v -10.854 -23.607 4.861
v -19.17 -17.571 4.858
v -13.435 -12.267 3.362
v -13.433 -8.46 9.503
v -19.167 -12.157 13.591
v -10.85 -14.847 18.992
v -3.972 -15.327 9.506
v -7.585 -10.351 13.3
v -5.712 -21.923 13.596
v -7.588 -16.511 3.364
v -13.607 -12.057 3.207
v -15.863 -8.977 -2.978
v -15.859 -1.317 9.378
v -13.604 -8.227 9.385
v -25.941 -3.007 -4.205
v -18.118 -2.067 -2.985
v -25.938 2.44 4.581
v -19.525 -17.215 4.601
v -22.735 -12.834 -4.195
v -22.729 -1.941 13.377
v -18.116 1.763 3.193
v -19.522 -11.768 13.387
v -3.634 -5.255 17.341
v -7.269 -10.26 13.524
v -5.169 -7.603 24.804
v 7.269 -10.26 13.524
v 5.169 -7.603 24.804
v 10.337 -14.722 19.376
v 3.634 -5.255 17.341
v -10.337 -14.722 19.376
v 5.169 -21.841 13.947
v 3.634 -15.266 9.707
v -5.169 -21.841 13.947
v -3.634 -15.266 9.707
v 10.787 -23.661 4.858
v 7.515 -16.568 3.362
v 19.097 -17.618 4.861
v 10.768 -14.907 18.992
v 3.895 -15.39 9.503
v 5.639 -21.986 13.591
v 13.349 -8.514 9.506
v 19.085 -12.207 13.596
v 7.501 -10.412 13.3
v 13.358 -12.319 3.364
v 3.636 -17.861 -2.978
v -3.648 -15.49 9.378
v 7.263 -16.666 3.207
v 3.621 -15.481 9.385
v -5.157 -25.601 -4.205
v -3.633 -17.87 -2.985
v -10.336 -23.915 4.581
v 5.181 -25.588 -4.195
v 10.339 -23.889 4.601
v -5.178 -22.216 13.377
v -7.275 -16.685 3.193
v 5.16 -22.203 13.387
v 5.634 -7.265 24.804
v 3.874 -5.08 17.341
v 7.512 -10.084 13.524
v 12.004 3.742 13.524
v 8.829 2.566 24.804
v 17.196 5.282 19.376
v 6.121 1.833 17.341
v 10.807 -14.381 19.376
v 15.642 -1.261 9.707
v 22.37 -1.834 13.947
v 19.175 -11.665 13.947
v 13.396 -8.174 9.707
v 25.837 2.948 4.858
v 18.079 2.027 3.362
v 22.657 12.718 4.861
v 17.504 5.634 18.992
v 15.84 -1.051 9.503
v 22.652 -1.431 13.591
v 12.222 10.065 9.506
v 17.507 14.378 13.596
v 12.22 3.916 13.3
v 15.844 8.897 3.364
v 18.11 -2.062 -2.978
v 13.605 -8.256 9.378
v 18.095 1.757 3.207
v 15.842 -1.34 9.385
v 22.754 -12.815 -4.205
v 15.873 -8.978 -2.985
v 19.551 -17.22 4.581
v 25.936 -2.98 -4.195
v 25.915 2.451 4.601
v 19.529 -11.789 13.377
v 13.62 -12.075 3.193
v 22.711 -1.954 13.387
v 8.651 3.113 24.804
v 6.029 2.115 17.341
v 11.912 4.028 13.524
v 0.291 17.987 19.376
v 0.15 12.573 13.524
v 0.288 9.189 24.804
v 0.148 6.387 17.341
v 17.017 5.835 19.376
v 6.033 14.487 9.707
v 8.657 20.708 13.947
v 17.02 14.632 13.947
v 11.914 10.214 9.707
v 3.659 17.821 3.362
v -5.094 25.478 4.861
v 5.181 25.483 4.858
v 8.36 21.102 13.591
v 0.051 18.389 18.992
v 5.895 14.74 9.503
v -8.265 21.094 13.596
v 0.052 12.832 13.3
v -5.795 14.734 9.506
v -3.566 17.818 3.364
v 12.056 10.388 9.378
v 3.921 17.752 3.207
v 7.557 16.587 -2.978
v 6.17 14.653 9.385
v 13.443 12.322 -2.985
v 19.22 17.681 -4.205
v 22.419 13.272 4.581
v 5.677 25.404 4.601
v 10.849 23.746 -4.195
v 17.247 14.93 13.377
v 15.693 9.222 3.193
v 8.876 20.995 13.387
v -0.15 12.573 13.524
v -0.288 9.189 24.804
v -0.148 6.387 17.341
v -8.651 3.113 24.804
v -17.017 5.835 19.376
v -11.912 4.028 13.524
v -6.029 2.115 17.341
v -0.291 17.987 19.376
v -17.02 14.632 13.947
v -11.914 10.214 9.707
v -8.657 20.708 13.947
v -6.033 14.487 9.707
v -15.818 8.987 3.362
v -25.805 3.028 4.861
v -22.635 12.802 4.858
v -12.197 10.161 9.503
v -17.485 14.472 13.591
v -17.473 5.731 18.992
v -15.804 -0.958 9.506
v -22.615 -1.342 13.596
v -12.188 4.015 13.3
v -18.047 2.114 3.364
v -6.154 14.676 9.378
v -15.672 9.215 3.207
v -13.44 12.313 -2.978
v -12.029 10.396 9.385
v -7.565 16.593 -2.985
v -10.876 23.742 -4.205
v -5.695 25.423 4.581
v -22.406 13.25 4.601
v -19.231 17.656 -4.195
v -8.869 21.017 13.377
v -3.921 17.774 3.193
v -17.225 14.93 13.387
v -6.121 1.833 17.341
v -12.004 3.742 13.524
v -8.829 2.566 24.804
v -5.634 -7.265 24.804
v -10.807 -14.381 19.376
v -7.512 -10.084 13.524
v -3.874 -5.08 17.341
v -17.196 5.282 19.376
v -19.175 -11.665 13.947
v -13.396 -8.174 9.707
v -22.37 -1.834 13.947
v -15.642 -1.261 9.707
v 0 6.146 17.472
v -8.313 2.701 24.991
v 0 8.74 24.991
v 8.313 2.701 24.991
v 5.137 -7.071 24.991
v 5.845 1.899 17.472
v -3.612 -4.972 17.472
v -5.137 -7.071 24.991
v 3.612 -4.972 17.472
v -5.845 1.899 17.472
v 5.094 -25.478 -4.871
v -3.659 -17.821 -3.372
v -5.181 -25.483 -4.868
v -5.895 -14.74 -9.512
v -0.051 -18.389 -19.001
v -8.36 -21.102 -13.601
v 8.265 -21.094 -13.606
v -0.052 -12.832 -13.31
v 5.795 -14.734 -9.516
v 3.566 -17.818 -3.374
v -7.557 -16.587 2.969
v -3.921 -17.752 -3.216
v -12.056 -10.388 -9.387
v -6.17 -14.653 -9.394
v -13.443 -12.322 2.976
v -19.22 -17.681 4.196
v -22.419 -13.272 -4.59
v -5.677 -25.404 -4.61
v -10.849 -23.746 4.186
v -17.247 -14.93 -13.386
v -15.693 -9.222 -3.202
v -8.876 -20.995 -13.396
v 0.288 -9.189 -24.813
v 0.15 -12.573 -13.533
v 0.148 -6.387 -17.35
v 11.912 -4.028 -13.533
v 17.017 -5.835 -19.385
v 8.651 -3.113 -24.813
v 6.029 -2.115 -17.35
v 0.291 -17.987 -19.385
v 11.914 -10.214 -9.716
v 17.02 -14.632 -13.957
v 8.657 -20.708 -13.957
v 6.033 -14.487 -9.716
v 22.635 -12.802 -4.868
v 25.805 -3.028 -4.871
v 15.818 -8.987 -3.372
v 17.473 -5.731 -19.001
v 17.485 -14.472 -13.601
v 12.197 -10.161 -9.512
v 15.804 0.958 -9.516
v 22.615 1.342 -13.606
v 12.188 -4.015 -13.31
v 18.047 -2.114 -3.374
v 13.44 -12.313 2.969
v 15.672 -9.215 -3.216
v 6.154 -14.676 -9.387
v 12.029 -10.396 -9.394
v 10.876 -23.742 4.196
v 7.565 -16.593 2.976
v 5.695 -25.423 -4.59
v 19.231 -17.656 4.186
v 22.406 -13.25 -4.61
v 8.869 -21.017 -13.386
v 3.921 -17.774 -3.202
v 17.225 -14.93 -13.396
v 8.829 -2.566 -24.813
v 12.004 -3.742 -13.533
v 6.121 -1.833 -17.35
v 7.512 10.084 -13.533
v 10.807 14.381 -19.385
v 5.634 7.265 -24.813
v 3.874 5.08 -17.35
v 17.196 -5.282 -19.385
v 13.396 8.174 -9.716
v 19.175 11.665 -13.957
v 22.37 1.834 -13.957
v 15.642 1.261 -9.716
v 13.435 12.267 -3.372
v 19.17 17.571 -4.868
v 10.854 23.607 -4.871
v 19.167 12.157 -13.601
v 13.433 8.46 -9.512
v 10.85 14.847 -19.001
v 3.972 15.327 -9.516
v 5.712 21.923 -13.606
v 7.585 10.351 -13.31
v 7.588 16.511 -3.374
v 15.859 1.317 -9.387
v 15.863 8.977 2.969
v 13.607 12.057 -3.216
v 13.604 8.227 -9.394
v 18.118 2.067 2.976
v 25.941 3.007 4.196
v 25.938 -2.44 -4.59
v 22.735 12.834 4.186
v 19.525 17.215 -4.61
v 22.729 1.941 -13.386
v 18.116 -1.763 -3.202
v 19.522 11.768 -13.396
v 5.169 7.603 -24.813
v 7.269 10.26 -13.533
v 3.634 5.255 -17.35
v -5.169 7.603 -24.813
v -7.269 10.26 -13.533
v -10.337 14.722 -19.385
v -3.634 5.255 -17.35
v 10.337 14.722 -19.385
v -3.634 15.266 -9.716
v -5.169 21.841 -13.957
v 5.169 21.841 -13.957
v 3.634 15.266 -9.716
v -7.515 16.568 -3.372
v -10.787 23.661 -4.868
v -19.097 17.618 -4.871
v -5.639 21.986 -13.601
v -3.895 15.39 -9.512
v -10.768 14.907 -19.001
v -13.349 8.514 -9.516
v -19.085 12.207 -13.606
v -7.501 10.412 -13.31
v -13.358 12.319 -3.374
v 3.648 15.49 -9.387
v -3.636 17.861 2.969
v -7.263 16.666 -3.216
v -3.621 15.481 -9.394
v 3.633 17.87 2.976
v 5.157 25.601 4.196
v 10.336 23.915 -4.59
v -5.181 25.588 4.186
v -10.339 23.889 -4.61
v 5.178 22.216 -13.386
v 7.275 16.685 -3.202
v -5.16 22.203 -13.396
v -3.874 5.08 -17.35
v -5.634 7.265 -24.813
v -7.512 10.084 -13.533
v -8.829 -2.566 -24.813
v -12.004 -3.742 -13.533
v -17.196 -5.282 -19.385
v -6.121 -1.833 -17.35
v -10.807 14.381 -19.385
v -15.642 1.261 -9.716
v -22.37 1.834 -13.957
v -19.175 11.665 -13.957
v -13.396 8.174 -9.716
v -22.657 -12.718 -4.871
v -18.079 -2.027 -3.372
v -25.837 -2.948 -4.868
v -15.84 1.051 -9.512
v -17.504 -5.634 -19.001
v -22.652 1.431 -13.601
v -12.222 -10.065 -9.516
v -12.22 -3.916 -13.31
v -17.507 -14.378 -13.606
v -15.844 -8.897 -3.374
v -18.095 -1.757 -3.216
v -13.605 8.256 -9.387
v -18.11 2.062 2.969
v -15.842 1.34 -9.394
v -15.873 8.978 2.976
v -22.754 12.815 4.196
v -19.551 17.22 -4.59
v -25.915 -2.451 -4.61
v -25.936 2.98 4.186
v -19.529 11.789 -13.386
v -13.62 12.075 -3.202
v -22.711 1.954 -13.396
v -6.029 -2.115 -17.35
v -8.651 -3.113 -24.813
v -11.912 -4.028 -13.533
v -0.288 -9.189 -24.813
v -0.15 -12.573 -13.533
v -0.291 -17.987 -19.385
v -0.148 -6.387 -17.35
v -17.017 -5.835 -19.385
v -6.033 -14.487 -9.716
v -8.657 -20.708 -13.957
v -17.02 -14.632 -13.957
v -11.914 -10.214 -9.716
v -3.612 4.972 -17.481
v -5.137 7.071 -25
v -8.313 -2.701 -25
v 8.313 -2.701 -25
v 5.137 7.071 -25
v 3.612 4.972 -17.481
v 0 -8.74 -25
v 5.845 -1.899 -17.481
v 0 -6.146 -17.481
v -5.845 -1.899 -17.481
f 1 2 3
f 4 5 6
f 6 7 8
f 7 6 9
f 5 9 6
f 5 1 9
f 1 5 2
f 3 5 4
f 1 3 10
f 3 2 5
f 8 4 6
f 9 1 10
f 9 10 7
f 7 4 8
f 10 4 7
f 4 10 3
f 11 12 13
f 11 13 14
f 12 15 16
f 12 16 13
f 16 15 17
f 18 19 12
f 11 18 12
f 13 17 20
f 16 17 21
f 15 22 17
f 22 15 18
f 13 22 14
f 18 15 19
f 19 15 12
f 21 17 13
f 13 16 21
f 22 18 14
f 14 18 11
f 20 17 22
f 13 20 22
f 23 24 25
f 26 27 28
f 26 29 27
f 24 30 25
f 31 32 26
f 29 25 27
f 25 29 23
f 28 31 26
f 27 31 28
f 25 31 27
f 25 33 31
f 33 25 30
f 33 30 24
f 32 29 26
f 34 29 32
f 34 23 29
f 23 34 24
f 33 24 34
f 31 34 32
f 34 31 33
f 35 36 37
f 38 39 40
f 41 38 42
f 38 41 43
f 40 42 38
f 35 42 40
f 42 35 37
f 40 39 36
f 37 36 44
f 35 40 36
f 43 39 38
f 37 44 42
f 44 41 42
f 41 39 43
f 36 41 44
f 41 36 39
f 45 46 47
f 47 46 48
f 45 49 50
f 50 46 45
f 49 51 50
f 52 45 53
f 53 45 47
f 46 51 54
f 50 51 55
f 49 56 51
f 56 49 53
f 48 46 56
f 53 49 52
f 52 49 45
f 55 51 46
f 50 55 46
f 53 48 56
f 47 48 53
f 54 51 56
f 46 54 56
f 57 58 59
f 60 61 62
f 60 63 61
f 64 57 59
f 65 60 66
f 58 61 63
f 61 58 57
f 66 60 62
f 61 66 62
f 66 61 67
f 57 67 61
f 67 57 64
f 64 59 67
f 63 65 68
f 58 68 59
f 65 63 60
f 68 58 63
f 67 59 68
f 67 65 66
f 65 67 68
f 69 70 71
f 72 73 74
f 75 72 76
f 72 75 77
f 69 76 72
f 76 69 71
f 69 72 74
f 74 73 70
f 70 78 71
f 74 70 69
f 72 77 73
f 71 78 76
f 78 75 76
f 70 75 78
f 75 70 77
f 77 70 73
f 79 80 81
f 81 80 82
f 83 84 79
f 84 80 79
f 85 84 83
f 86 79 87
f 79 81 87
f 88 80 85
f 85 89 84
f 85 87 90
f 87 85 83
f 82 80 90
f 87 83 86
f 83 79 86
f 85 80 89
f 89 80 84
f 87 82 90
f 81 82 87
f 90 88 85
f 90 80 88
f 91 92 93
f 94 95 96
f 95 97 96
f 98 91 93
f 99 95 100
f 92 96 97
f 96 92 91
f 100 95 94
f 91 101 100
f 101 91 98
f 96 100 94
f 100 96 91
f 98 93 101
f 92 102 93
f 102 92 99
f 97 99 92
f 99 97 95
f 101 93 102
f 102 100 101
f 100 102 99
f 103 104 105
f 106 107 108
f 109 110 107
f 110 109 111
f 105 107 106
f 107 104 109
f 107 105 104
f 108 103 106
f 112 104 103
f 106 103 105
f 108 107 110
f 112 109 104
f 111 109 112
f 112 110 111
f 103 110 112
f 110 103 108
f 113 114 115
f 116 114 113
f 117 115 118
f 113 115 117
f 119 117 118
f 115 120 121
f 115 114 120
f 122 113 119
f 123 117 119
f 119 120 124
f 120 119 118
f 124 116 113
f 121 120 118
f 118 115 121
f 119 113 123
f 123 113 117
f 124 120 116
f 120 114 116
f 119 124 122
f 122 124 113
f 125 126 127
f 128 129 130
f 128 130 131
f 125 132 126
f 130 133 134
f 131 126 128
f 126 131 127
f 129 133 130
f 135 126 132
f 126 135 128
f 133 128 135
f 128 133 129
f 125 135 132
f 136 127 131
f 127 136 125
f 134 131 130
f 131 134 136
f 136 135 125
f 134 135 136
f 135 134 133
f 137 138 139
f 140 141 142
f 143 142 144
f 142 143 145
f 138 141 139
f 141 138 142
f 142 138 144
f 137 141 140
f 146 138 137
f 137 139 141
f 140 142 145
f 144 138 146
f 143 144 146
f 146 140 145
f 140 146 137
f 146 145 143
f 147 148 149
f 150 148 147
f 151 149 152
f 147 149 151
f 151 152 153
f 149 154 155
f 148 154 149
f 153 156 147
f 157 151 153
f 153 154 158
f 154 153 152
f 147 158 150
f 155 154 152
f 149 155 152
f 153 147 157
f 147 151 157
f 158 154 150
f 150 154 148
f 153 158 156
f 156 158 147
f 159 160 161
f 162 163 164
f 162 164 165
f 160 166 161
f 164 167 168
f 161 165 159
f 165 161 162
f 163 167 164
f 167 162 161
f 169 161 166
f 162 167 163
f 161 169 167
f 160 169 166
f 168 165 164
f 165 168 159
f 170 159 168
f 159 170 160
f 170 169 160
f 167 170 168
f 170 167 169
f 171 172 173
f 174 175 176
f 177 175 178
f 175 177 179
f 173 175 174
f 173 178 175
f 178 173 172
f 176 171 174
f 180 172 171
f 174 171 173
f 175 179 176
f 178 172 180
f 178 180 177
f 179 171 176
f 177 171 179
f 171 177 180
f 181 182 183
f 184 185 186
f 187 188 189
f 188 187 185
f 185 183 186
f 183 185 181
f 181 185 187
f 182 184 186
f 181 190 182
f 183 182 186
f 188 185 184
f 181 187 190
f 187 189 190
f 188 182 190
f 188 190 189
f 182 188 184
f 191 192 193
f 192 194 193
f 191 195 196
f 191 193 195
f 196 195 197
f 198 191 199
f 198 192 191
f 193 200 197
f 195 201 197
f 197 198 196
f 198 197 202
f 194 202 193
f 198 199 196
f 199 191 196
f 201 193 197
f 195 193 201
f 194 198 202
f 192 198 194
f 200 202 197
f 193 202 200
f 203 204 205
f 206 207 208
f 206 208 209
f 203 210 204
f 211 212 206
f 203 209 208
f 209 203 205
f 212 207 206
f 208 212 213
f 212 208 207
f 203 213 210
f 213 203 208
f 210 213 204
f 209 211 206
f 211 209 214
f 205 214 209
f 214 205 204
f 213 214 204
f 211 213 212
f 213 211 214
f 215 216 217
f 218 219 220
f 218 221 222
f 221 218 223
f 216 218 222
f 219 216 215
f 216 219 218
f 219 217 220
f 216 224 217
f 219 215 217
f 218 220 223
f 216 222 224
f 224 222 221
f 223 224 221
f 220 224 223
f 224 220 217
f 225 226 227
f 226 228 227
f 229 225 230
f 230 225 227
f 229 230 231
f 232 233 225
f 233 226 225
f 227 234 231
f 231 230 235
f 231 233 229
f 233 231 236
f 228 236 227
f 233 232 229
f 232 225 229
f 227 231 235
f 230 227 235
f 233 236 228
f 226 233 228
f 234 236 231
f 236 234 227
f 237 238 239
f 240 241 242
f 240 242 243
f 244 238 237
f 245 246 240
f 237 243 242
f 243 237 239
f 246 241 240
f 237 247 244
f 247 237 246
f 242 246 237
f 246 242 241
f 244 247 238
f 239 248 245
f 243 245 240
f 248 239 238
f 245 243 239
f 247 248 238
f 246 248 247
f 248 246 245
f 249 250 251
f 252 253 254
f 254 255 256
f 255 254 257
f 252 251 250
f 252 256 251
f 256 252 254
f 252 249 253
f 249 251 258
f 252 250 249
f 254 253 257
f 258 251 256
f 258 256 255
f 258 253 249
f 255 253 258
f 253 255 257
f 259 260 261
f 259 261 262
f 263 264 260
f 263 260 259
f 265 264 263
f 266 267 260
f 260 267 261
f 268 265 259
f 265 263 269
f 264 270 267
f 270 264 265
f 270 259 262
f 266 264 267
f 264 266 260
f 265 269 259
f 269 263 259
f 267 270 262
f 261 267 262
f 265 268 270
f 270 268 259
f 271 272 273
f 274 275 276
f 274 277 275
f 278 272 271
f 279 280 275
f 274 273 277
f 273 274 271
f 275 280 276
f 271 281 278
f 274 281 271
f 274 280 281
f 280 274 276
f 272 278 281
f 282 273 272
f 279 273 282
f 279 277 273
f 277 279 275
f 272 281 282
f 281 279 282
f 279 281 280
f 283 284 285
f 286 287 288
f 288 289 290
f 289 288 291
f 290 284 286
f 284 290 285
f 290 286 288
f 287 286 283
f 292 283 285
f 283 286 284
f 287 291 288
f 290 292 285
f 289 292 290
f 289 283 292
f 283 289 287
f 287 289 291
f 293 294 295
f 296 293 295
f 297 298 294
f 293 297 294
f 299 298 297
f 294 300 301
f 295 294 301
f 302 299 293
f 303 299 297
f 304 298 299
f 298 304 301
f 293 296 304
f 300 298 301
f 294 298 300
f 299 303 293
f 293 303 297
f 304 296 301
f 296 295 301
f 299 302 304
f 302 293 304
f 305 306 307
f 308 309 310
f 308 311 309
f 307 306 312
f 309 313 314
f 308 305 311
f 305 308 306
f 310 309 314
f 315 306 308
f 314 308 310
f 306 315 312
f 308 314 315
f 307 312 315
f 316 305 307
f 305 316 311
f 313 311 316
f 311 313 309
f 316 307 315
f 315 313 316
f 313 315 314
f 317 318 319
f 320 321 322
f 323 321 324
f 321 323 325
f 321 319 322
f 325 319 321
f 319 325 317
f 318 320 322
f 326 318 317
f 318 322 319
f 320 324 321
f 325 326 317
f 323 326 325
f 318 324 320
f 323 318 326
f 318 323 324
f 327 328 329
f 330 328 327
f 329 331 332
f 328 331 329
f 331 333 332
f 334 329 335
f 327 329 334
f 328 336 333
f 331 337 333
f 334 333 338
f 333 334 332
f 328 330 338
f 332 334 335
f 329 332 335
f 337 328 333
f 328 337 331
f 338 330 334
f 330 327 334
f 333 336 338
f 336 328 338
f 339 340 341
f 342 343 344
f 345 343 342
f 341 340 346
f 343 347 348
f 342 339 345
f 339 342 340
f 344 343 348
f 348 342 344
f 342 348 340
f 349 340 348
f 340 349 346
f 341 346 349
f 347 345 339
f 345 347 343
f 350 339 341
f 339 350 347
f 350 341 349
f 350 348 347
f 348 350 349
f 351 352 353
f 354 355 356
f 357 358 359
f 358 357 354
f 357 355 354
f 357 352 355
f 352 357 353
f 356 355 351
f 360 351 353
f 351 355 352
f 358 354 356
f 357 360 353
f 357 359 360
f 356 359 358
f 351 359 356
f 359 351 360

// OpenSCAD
height = 50; 
spacing = 0.5;

// create a generalized pentagon by length.
// Parameters:
//     length : the side length
//     spacing : the gap between a pentagon or a hexagon
module generalized_pentagon(length, spacing = 0.5) {
    r = 0.5 * length / sin(36);
	s = (r - spacing / 2) / r;

    color("black") 
	    rotate(18) 		     
		     linear_extrude(length, scale = 1.42215)
		        scale([s, s, s])
			        children(); 
}

// create a generalized hexagon by length.
// Parameters:
//     length : the side length
//     spacing : the gap between a pentagon or a hexagon
module generalized_hexagon(length, spacing = 0.5) {
    r = 0.5 * length / sin(30);
	s = (r - spacing / 2) / r;

    color("white") 
	     linear_extrude(length - length * 0.02125, scale = 1.42215) 
		    scale([s, s, s])			
		        children();
}

// a placeholder pentagon, one generalized pentagon and two generalized hexagons.
// Parameters:
//     length : the side length
//     spacing : the gap between the pentagon and hexagon
module generalized_pentagon_based_sub_comp(length, spacing = 0.5) {
	pentagon_circle_r = 0.5 * length / sin(36);
	
	a = 37.325;
	
	offset_y = 0.5 * length * tan(54) + pentagon_circle_r * cos(a);
	offset_z = 0.5 * length * tan(60) * sin(a);
	
	translate([0, -offset_y, -offset_z]) 
	    rotate([a, 0, 0]) 
		    generalized_hexagon_based_sub_comp(length, spacing) {
			    children(0); 
				children(1); 
			}
}

// two generalized hexagons and one generalized pentagon.
// Parameters:
//     length : the side length
//     spacing : the gap between the pentagon and hexagon
module generalized_hexagon_based_sub_comp(length, spacing = 0.5) {
    children(1); 
	
	length_center_to_side = 0.5 * length * tan(54);
	
    a = -37.325;
	
	offset_y = 0.5 * length * (tan(54) * cos(a) + tan(60));
	offset_z = length_center_to_side * sin(a);
	
	rotate(120) translate([0, offset_y, offset_z]) 
	    rotate([a, 0, 0]) 
	        generalized_pentagon_hexagon(length, spacing) {
			    children(0);
			    children(1);
			}
			
}

// a generalized pentagon and a generalized hexagon.
// Parameters:
//     length : the side length
//     spacing : the gap between the pentagon and hexagon
module generalized_pentagon_hexagon(length, spacing = 0.5) {
	pentagon_circle_r = 0.5 * length / sin(36);
	
	children(0); 
	
	a = 37.325;
	
	offset_y = 0.5 * length * tan(54) + pentagon_circle_r * cos(a);
	offset_z = 0.5 * length * tan(60) * sin(a);
	
	rotate(144) translate([0, -offset_y, -offset_z]) 
	    rotate([a, 0, 0]) 
		    children(1); 
}

// a half of generalized soccer polyhedron.
// Parameters:
//     line_length : the side length of pentagons and hexagons
//     spacing : the gap between the pentagon and hexagon
module generalized_half_soccer_polyhedron(line_length, spacing = 0.5) {
	pentagon_circle_r = 0.5 * line_length / sin(36);
	offset_y = pentagon_circle_r * cos(36);

	children(0);
	
	for(i = [0:4]) {
		rotate(72 * i) 
		    generalized_pentagon_based_sub_comp(line_length, spacing) {
			    children(0);
				children(1);
			}
	}
}

// a generalized soccer polyhedron.
// Parameters:
//     line_length : the side length of pentagons and hexagons
//     spacing : the gap between the pentagon and hexagon
//     center : center it or not
module generalized_soccer_polyhedron(height, spacing = 0.5, center = true) {
    line_length = height / 6.65;
	
	offset_for_center = center ? height / 2: 0;
	
	translate([0, 0, -offset_for_center]) union() {
		translate([0, 0, -line_length + line_length * 6.64875]) 
		    generalized_half_soccer_polyhedron(line_length, spacing) {
			    generalized_pentagon(line_length, spacing) children(0);
			    generalized_hexagon(line_length, spacing) children(1);			
			}
			
		rotate(36) mirror([0, 0, 1]) translate([0, 0, -line_length]) 
		    generalized_half_soccer_polyhedron(line_length, spacing) {
			    generalized_pentagon(line_length, spacing) children(0);
			    generalized_hexagon(line_length, spacing) children(1);				
			}
	}
}

// create a pentagon according the height of the soccer polyhedron
module pentagon_for_soccer_polyhedron(height) {
    line_length = height / 6.65;
    circle(0.5 * line_length / sin(36), $fn = 5);
}

// create a hexagon according the height of the soccer polyhedron
module hexagon_for_soccer_polyhedron(height) {
    line_length = height / 6.65;
    circle(0.5 * line_length / sin(30), $fn = 6);			
}

generalized_soccer_polyhedron(height, spacing) {
    pentagon_for_soccer_polyhedron(height); 
	 hexagon_for_soccer_polyhedron(height);
}
